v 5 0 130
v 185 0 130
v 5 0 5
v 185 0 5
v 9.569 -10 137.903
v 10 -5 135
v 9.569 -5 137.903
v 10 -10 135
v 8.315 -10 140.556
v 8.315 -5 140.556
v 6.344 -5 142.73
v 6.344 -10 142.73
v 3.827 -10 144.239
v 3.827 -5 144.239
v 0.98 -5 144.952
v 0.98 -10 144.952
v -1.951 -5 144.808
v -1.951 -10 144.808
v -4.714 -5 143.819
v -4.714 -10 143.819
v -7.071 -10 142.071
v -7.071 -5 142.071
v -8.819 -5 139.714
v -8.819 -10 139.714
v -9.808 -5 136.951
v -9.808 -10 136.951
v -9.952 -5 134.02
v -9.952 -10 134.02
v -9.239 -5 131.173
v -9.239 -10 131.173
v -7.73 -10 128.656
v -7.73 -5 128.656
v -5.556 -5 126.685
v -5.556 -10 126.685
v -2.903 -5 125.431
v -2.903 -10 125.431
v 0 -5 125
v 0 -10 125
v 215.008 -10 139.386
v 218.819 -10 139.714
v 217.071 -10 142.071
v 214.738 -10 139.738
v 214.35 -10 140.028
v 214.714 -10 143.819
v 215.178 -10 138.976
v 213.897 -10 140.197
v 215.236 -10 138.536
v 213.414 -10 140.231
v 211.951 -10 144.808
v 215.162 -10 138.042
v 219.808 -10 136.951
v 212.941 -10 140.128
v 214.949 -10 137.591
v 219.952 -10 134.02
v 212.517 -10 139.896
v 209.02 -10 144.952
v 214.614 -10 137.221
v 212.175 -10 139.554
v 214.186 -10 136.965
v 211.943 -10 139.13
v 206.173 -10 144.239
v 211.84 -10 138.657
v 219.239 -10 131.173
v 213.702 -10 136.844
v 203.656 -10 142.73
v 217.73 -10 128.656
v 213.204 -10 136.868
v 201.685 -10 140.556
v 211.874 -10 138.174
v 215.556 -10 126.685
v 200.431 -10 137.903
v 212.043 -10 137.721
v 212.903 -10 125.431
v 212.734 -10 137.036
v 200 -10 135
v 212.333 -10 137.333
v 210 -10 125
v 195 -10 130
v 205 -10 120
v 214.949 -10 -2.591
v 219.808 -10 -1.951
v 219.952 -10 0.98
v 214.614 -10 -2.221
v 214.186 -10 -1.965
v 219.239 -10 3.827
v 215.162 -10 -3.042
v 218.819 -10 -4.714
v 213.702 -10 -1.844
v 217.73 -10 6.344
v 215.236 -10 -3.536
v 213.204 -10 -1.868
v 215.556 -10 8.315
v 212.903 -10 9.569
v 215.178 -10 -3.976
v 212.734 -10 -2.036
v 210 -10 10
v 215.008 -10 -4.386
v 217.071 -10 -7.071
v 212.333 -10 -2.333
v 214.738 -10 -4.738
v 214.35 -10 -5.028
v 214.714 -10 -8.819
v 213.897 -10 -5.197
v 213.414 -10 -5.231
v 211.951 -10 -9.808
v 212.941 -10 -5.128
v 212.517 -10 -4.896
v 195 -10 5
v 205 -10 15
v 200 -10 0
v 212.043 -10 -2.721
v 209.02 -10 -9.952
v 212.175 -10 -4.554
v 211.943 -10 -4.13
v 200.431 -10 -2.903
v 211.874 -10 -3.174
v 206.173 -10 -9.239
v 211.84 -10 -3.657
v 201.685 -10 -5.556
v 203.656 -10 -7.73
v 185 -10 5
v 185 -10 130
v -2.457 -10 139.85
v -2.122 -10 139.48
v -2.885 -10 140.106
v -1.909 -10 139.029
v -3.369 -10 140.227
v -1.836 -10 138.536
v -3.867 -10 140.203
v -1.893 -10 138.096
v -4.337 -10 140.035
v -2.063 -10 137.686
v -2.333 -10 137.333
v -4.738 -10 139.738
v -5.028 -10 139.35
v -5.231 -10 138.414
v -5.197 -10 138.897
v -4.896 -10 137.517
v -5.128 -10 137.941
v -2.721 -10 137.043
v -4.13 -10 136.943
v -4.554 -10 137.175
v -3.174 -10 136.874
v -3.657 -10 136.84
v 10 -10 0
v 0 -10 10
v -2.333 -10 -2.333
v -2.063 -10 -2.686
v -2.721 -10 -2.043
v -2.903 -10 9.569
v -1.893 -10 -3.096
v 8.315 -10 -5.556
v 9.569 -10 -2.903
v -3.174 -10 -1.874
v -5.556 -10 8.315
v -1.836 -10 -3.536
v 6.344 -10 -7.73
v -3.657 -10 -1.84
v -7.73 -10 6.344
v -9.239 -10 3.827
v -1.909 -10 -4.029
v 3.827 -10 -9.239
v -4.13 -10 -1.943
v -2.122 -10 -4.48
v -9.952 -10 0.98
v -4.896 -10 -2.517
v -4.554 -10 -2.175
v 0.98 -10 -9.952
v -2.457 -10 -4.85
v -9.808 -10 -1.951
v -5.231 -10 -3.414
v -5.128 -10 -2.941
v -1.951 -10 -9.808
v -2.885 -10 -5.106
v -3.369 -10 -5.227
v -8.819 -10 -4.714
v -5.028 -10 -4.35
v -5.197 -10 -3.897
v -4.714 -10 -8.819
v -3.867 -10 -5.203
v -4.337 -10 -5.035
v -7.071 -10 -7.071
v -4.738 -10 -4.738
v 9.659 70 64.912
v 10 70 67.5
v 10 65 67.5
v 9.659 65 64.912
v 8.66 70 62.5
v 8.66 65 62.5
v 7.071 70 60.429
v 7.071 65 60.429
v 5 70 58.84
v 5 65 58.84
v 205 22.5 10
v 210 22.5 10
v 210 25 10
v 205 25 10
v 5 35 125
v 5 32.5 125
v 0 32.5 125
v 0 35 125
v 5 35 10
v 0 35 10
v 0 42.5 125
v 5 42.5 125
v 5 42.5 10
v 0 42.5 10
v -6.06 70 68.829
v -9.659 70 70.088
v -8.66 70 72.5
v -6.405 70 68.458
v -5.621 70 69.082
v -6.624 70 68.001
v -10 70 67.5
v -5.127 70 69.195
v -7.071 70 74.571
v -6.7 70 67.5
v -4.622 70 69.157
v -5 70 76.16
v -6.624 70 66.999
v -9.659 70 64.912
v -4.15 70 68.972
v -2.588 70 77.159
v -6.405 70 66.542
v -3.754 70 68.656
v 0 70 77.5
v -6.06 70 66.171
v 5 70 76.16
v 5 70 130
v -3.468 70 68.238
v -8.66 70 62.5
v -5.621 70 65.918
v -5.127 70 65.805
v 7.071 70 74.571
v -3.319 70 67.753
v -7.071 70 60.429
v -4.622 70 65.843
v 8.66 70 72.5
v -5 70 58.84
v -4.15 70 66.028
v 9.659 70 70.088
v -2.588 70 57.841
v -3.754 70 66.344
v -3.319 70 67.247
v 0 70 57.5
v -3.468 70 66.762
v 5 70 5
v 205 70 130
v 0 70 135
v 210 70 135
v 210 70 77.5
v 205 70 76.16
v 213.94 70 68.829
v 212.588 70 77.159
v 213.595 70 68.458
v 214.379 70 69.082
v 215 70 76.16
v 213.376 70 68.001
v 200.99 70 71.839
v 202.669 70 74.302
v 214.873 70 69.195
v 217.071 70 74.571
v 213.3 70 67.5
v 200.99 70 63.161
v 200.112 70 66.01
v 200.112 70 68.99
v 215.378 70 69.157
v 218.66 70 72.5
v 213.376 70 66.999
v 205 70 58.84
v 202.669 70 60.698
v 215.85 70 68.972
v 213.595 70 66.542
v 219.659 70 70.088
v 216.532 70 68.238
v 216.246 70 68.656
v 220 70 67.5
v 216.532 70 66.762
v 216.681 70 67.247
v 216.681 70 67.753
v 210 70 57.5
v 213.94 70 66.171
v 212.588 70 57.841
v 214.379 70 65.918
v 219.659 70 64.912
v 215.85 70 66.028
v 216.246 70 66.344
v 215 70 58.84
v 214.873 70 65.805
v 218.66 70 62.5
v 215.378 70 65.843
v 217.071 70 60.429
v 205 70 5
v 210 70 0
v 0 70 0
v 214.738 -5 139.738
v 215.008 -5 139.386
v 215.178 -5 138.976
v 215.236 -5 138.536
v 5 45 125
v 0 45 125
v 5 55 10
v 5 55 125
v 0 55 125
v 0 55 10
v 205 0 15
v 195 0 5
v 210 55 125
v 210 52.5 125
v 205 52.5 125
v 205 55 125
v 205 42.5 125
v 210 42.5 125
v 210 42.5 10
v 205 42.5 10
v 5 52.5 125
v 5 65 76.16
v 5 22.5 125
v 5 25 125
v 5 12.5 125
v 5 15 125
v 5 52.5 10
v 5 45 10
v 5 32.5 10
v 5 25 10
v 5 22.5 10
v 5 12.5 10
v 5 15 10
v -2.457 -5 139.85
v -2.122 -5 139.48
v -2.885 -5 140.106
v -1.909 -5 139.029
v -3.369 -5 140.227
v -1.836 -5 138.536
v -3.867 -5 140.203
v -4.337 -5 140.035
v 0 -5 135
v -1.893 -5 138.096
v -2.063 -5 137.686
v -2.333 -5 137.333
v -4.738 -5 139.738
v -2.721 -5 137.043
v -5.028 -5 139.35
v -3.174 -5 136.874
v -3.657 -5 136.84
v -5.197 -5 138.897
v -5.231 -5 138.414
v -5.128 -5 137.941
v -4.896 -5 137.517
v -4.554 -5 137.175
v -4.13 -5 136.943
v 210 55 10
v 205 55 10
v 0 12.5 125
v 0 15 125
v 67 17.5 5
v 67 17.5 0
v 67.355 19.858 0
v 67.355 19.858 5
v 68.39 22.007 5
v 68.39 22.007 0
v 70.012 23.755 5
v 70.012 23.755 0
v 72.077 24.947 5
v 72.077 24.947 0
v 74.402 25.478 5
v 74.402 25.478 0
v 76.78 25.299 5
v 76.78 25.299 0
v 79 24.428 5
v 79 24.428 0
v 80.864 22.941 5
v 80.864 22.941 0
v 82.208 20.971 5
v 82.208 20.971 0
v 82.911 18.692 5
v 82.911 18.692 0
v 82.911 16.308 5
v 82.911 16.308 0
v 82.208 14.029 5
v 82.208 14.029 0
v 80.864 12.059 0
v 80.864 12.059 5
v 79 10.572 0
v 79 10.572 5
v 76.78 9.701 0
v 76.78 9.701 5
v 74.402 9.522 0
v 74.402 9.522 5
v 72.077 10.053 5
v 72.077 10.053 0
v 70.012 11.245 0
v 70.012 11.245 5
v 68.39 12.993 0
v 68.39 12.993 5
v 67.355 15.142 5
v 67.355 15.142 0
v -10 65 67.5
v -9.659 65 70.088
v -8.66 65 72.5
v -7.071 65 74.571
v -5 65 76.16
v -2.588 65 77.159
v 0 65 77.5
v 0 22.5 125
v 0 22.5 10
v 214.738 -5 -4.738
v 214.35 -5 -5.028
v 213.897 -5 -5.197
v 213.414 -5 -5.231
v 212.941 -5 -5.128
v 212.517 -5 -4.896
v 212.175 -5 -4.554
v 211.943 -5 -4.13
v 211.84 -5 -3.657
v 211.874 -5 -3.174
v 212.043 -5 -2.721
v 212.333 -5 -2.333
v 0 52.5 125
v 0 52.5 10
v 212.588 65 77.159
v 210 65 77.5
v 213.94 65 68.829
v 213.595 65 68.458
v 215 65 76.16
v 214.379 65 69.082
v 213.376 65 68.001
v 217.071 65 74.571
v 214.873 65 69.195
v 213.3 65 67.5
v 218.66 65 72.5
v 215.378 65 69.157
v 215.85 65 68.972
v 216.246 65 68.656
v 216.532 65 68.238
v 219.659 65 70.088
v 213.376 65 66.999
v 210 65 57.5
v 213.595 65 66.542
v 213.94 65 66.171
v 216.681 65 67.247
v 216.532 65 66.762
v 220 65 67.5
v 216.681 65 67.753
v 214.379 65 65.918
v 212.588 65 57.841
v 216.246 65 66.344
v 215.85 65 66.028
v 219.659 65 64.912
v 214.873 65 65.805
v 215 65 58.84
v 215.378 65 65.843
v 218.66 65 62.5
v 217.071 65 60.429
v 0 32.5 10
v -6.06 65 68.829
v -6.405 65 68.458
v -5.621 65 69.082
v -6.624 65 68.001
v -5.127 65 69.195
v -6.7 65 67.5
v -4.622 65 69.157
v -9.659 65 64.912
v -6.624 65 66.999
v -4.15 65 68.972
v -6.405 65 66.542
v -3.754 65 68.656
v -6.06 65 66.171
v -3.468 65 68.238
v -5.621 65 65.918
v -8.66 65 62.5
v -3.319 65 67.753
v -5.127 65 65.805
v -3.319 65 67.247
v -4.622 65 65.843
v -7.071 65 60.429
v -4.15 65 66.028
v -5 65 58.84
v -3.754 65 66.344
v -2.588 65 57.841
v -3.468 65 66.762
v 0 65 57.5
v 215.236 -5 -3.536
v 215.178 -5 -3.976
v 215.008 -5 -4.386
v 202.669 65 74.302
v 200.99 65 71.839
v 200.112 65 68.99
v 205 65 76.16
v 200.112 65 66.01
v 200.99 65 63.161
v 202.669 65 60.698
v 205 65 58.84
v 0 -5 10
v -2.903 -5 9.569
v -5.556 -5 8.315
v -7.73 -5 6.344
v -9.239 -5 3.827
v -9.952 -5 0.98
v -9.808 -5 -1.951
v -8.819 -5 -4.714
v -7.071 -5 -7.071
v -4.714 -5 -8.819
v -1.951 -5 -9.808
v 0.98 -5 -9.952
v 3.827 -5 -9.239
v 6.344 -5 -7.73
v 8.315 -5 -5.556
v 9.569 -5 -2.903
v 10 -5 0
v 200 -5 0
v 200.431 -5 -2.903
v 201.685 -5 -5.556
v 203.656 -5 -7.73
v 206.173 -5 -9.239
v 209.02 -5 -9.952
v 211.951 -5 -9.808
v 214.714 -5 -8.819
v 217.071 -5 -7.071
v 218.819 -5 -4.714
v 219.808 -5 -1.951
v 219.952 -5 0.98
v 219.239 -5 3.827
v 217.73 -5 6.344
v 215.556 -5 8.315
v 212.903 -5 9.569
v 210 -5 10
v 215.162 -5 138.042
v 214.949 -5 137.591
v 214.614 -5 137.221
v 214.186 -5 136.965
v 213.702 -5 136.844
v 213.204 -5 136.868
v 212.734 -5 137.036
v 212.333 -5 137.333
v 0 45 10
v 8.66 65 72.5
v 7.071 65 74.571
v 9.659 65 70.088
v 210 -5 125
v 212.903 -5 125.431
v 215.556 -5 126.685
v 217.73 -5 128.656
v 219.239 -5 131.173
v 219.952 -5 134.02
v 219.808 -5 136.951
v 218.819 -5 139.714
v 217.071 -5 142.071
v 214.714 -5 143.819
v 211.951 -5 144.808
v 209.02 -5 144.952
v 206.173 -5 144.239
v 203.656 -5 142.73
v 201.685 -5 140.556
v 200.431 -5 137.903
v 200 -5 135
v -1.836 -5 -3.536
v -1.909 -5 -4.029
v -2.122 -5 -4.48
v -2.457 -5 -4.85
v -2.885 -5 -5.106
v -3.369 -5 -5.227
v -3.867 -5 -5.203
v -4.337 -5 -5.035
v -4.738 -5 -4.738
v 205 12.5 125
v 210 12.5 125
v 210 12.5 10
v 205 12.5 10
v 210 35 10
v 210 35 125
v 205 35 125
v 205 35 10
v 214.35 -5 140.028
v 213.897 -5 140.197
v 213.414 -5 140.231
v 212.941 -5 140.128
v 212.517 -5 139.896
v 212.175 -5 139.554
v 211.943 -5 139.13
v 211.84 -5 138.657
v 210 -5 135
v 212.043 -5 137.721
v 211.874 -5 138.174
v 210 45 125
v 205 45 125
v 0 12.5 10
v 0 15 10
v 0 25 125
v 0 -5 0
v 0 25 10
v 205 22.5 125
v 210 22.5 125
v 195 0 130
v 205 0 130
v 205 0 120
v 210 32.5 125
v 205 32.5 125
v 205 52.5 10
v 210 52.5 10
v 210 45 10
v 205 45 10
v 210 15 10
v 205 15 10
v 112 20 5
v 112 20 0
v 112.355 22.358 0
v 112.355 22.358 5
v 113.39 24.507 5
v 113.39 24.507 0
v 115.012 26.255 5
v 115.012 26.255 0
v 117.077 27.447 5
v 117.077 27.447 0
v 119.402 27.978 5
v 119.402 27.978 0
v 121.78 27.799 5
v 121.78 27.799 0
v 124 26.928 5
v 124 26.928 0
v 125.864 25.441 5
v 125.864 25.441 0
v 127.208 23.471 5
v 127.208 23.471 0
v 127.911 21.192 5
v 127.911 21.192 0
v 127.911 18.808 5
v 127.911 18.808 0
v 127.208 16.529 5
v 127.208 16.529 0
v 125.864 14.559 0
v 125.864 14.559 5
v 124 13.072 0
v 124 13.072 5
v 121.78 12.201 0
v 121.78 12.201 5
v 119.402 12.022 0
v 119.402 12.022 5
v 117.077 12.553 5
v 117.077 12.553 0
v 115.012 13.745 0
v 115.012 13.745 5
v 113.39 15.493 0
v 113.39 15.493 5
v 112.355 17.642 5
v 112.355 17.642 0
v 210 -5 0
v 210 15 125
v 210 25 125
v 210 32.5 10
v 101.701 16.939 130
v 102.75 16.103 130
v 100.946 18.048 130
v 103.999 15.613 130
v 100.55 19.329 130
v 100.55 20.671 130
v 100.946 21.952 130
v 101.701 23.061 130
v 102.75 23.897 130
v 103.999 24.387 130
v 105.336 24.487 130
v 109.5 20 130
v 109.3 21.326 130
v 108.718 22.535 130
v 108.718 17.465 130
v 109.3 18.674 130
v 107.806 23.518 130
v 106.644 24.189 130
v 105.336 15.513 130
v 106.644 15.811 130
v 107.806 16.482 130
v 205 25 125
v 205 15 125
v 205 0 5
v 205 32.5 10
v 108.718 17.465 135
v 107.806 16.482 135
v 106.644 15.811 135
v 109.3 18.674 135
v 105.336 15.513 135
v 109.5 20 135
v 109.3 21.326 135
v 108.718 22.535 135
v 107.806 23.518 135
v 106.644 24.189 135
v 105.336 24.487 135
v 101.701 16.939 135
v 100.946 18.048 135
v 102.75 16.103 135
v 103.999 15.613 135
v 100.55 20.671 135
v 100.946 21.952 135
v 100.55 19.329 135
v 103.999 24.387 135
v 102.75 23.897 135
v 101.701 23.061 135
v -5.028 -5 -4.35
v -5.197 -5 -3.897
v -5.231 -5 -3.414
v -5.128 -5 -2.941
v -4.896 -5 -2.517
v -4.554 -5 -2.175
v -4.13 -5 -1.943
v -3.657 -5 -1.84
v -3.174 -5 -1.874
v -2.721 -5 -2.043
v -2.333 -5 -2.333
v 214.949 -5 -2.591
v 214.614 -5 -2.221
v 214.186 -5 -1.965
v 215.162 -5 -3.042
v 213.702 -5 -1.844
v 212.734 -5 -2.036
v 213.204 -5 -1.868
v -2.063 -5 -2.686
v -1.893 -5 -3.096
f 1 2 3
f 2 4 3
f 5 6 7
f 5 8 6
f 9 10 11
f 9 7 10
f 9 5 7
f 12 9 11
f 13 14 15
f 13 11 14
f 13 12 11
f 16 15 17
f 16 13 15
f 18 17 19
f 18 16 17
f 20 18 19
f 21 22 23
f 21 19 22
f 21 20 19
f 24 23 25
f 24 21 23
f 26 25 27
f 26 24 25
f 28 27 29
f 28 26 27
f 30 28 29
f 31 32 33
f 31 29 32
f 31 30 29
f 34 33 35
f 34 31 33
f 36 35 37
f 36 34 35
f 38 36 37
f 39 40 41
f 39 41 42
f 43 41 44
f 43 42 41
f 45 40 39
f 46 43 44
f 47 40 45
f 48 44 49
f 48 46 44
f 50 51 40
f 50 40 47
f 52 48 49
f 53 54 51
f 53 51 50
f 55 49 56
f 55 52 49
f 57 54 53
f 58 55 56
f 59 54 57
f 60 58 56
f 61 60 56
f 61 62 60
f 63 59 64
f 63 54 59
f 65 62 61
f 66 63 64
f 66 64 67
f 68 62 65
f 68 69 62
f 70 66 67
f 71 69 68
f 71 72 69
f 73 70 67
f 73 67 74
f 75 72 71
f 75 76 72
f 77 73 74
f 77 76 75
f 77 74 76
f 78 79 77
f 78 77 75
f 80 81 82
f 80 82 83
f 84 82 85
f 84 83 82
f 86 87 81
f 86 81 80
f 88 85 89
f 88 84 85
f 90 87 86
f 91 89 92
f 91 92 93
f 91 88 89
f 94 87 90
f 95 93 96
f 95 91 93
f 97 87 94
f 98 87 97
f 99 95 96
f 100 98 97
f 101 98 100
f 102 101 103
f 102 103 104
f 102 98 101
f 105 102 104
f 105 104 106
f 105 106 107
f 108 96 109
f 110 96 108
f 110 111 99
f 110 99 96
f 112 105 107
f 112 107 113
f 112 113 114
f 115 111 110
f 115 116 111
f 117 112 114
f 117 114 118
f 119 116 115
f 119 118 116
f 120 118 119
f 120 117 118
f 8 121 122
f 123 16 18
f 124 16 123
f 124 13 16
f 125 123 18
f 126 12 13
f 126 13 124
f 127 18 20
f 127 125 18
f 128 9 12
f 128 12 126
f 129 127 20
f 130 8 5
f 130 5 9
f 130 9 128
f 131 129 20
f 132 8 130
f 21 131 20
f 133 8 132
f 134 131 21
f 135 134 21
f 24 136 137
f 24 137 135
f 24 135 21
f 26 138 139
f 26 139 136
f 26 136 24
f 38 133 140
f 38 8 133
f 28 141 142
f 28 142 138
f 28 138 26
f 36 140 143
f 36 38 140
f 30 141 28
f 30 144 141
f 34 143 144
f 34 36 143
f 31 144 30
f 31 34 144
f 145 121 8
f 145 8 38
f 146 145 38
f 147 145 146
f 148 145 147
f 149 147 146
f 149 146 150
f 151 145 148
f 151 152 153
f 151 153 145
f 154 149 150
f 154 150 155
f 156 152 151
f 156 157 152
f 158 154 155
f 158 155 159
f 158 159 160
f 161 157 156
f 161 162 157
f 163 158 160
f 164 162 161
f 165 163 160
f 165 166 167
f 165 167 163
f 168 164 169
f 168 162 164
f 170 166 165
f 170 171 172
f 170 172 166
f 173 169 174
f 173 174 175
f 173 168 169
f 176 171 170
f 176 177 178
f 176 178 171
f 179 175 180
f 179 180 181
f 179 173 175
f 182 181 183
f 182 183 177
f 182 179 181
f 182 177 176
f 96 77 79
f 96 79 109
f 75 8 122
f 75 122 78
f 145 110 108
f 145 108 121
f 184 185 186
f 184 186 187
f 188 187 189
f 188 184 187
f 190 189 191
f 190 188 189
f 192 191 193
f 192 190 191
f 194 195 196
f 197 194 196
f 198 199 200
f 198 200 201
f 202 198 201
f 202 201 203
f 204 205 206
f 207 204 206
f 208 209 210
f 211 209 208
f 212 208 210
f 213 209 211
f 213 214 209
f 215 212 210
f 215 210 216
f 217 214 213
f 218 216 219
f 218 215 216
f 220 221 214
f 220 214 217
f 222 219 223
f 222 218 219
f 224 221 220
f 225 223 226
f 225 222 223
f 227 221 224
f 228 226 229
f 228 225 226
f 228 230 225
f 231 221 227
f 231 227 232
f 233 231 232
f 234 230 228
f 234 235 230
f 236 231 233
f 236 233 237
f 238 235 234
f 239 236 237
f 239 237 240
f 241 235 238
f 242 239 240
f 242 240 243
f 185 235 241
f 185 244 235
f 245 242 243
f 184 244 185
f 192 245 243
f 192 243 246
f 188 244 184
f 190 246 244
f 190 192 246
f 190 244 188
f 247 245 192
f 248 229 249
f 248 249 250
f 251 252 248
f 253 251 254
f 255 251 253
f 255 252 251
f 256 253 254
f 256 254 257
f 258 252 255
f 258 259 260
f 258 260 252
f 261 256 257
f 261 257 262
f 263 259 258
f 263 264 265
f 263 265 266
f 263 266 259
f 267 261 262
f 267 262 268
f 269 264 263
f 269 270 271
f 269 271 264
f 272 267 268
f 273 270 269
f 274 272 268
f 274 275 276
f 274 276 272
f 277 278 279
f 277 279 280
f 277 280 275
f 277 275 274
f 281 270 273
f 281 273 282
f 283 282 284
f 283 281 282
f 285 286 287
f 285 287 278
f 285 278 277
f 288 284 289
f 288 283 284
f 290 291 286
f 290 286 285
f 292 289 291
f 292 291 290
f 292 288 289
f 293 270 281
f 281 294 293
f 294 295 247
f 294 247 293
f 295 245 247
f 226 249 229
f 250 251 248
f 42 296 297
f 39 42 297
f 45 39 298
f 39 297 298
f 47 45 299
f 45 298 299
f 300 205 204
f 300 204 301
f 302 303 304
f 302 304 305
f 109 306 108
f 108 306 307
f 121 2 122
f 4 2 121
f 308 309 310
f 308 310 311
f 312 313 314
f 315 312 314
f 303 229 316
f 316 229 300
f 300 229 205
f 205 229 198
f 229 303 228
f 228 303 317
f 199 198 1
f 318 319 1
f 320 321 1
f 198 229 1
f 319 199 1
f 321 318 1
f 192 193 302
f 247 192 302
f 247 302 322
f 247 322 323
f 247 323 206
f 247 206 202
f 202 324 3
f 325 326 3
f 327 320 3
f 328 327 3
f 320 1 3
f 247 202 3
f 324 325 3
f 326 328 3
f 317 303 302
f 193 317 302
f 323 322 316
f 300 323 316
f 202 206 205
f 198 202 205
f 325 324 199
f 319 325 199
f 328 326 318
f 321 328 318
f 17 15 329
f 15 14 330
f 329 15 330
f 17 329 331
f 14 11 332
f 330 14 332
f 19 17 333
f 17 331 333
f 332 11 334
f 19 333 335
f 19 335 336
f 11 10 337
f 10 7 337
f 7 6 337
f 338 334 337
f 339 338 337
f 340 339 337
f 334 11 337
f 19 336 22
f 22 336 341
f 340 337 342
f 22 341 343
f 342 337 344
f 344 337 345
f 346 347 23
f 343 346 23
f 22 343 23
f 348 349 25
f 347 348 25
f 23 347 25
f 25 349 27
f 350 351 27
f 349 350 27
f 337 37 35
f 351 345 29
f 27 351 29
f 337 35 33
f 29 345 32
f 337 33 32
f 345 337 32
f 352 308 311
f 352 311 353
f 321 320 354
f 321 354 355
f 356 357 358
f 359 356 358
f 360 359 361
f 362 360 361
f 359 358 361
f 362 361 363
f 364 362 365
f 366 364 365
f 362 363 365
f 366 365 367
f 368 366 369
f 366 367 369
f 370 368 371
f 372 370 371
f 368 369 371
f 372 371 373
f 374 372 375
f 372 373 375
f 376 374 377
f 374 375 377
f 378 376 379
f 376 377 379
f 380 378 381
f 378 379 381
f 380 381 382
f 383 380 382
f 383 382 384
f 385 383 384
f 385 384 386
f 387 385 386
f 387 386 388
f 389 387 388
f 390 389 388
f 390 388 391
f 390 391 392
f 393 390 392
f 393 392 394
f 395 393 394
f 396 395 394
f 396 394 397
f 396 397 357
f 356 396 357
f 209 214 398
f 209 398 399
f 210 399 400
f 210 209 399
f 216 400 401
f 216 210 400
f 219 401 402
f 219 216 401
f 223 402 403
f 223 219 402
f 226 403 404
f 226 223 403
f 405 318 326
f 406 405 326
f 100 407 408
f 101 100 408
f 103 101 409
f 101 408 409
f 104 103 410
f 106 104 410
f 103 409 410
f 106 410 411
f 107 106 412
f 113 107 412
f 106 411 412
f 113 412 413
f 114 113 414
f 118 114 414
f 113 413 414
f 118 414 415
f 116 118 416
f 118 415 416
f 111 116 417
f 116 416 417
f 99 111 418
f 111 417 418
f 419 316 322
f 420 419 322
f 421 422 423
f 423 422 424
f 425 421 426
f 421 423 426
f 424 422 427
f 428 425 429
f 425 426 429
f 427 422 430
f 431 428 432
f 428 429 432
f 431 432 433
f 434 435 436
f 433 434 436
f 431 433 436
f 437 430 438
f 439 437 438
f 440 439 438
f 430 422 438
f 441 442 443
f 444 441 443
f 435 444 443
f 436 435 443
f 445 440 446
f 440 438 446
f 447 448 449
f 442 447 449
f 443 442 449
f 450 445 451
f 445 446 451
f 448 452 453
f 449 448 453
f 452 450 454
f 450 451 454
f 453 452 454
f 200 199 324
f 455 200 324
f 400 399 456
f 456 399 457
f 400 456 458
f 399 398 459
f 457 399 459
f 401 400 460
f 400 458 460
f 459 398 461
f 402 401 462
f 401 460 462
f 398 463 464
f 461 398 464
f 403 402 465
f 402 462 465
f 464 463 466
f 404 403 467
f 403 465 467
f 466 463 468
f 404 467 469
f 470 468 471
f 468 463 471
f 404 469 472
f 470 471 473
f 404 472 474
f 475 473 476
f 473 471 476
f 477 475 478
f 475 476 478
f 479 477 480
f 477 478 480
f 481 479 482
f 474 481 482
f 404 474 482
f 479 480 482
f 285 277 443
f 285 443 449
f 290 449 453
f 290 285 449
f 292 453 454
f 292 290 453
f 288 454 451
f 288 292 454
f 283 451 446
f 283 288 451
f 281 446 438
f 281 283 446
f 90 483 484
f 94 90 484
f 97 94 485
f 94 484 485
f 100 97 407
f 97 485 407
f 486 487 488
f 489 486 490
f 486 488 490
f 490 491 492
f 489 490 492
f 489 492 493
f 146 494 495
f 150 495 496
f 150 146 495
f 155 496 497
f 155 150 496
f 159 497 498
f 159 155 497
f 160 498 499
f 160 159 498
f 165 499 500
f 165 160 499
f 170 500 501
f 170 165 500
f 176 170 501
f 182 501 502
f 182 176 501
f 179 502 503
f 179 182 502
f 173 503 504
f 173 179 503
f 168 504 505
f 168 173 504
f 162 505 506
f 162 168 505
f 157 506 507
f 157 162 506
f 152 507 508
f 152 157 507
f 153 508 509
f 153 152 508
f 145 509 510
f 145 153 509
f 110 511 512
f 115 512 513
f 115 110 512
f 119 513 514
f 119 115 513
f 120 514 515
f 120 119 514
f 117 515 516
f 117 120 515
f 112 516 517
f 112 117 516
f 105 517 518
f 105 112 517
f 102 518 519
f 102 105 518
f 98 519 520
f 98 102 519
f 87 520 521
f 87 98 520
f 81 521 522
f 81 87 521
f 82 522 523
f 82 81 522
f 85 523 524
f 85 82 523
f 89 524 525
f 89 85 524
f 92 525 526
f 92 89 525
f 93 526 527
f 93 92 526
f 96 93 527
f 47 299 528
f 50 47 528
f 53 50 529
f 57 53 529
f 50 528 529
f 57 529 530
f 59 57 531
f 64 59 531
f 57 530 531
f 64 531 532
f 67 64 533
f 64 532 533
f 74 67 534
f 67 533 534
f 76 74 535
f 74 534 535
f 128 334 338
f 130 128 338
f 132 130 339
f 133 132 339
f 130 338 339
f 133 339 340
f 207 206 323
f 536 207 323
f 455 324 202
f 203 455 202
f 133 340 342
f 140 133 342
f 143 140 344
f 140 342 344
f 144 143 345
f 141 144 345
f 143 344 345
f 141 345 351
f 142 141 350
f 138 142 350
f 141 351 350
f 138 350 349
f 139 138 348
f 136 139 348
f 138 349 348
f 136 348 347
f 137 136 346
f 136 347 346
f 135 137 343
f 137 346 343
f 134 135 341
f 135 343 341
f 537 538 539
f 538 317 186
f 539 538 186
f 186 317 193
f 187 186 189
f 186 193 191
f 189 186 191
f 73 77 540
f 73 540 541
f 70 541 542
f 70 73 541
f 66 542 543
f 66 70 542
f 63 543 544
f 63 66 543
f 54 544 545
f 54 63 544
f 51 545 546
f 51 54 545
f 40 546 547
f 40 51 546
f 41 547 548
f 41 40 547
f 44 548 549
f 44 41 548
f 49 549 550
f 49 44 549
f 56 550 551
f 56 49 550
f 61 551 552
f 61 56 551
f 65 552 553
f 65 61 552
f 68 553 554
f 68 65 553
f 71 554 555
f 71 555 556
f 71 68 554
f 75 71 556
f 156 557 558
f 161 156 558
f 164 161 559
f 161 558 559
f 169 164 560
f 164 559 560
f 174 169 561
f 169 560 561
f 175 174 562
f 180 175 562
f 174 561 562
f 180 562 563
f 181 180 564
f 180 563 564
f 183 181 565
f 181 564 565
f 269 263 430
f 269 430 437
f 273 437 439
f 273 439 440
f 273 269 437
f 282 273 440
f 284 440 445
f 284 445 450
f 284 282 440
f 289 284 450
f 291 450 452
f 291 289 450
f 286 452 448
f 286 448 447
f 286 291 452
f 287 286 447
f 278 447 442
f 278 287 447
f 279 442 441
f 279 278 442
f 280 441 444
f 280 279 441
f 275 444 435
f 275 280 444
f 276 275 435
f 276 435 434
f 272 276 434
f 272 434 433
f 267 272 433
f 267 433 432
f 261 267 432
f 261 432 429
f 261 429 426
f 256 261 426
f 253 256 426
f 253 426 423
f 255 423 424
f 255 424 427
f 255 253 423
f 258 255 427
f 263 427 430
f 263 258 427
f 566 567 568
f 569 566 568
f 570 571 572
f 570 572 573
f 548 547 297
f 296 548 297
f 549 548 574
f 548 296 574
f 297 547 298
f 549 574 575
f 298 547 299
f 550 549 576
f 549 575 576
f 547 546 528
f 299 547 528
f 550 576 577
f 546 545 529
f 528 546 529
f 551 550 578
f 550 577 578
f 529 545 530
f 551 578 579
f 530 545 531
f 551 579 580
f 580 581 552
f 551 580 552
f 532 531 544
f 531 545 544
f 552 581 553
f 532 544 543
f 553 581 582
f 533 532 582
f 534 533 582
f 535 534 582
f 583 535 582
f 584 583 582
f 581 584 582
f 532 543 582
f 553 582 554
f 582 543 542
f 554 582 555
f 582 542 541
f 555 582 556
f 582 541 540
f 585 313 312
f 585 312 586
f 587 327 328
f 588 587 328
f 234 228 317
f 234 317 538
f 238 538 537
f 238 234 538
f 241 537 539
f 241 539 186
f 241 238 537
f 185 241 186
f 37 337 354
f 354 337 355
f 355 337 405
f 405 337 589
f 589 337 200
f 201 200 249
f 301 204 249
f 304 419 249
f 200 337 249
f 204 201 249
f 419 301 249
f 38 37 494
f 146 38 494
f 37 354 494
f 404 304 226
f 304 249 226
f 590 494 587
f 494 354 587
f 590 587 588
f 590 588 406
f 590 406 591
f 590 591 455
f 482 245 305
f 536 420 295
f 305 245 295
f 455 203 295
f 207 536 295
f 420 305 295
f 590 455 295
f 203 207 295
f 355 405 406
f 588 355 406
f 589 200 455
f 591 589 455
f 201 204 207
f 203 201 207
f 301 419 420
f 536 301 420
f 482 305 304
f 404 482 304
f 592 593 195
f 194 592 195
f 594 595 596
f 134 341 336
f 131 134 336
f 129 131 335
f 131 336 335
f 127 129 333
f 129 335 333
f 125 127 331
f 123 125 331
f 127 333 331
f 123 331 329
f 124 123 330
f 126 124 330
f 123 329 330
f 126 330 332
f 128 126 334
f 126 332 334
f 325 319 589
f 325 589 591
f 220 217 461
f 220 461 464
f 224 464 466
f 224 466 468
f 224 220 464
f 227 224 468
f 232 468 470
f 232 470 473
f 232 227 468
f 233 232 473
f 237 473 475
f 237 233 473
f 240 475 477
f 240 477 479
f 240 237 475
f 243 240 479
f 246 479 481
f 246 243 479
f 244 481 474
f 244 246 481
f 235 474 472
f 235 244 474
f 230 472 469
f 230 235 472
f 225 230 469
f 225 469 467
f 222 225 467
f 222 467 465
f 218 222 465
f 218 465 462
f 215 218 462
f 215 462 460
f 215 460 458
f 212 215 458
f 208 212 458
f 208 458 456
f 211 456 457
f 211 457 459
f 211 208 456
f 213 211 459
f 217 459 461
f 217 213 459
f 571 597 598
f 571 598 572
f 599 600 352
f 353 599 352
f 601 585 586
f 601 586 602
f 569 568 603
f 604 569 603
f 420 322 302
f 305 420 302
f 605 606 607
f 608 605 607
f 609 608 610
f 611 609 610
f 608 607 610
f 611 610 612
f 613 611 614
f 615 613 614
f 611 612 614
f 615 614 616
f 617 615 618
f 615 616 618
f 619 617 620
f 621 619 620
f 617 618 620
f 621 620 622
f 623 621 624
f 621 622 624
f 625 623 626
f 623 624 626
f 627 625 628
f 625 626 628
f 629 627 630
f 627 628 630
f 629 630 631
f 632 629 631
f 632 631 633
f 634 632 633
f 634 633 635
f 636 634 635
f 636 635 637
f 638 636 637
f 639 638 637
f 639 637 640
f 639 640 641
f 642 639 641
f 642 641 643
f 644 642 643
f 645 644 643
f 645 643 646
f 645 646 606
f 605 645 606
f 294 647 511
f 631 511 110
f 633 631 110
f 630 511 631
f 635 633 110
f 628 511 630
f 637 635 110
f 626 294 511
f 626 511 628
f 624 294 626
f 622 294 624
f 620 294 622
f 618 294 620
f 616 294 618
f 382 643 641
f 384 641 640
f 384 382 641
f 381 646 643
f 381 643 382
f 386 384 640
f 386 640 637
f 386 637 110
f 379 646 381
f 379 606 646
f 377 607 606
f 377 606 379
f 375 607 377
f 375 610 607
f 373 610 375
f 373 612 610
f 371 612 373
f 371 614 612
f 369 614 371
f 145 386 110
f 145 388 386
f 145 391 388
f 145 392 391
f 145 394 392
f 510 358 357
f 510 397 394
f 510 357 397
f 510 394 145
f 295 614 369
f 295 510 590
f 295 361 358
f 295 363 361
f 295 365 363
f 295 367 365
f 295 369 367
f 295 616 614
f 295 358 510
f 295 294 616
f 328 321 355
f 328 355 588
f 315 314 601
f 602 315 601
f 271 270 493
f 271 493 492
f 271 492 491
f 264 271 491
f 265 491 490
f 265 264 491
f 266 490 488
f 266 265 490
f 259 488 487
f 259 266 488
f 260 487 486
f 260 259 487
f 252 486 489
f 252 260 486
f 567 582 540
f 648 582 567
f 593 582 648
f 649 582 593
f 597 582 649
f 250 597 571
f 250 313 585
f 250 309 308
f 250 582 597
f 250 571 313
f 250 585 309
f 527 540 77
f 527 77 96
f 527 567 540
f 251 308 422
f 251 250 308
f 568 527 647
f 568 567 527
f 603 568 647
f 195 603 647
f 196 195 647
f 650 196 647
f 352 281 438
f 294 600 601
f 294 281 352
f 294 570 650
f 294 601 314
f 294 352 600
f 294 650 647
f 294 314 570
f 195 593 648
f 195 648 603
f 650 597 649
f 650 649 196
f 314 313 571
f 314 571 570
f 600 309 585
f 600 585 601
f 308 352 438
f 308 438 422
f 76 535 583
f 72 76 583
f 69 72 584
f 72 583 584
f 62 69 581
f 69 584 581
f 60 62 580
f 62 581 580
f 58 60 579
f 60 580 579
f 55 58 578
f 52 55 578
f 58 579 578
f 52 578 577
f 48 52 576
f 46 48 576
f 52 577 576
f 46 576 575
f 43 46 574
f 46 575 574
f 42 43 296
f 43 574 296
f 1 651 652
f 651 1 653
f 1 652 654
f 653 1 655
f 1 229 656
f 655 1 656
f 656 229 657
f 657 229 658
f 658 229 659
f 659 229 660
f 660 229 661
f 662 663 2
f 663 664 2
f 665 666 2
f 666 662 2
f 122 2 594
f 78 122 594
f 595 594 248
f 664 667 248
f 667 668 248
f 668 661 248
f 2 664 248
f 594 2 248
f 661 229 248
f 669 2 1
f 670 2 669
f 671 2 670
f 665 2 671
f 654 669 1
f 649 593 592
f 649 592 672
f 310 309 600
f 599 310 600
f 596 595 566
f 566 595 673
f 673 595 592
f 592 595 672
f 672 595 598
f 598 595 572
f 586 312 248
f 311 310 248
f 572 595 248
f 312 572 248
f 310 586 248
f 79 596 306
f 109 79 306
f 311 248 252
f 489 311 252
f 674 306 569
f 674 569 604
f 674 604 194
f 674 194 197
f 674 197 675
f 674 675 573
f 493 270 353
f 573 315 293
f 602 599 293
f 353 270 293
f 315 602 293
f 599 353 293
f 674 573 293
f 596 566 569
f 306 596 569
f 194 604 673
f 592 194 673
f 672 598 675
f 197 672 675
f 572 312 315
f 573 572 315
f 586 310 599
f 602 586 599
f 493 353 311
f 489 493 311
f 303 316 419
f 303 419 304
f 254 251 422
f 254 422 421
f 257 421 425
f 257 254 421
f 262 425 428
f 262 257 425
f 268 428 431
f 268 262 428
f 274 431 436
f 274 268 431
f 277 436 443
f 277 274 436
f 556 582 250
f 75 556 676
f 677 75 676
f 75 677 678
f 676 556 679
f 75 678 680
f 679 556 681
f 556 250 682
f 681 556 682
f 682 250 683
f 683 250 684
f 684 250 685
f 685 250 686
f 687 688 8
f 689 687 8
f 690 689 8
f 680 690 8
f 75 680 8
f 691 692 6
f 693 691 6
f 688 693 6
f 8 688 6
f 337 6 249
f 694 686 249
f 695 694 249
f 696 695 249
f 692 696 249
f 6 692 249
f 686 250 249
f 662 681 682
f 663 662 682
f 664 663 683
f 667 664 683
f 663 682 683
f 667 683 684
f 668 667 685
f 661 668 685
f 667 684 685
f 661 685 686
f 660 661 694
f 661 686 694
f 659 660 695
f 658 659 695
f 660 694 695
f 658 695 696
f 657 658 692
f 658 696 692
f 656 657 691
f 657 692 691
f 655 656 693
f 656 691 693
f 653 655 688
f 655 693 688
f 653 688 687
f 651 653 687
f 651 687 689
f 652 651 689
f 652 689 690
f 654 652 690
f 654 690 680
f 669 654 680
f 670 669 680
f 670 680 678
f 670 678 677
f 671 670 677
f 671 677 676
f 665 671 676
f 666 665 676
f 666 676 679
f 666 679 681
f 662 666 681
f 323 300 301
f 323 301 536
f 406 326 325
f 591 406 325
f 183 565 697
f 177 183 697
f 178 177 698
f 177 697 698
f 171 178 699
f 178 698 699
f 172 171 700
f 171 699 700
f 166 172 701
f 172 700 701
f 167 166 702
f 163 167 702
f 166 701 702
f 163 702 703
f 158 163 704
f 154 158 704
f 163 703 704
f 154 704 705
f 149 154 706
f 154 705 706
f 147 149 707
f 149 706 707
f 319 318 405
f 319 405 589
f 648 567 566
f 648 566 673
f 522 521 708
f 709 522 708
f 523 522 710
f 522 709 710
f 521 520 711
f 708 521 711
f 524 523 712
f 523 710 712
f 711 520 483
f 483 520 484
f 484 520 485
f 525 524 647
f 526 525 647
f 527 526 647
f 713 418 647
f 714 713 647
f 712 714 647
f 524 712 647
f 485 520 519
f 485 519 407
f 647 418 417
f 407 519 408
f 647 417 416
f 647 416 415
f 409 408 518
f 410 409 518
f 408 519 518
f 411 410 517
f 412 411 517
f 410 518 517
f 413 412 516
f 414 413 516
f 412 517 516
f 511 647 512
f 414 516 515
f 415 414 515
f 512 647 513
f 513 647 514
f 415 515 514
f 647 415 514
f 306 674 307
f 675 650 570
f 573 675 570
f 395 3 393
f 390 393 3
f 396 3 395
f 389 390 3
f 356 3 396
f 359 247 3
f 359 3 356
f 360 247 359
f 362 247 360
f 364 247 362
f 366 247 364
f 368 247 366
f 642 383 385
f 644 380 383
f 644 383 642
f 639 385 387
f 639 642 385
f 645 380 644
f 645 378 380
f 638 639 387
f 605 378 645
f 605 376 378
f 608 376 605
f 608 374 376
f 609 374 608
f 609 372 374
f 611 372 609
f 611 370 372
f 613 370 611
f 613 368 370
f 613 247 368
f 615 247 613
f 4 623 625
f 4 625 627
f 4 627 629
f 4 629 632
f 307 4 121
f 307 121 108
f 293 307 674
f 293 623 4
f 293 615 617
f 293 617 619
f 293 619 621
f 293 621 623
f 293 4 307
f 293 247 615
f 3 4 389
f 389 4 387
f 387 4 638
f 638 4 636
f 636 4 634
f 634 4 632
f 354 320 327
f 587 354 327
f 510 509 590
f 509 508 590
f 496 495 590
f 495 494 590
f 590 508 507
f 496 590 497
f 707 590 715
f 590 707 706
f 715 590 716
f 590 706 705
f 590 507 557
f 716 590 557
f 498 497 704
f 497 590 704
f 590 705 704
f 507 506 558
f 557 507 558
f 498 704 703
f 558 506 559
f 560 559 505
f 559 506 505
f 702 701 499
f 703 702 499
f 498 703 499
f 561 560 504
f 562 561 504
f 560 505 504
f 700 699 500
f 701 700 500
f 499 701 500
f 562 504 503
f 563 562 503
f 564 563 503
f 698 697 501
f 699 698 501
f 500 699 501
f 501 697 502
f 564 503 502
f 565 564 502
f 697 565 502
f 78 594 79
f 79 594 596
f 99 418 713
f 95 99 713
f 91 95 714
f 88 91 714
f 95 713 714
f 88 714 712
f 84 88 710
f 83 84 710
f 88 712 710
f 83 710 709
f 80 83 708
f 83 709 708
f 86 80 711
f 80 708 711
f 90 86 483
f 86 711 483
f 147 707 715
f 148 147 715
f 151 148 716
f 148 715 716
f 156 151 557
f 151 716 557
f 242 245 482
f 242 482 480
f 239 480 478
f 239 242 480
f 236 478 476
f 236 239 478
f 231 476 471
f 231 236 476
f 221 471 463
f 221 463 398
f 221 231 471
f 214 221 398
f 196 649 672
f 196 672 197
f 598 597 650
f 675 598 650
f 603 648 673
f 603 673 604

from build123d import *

# Parameters (mm, degrees)
SKETCH1_W           = 200
SKETCH1_H           = 125
BOSS_EXTRUDE1_DEPTH = 70
SKETCH2_W           = 210
SKETCH2_H           = 135
BOSS_EXTRUDE2_DEPTH = 10
SKETCH3_R           = 10
BOSS_EXTRUDE5_DEPTH = 5
CUT_EXTRUDE2_DEPTH  = 5
CUT_EXTRUDE3_DEPTH  = 10
SKETCH10_W          = 10
SKETCH10_H          = 125
CUT_EXTRUDE4_DEPTH  = 10
BOSS_EXTRUDE6_DEPTH = 5
SKETCH12_R          = 8
CUT_EXTRUDE5_DEPTH  = 10
SKETCH15_R          = 4.5
CUT_EXTRUDE6_DEPTH  = 10
SKETCH18_W          = 115
SKETCH18_H          = 2.5
CUT_EXTRUDE7_DEPTH  = 220


with BuildPart() as part:
    # Sketch1 → Boss-Extrude1 (new body)
    with BuildSketch(Plane(origin=(0, 0, 0), x_dir=(1, 0, 0), z_dir=(0, 1, 0))):
        Polygon((210, 0), (0, 0), (0, -135), (5, -135), (210, -135), align=None)
        with Locations((105, -67.5)):
            Rectangle(SKETCH1_W, SKETCH1_H, mode=Mode.SUBTRACT)
    extrude(amount=BOSS_EXTRUDE1_DEPTH)

    # Sketch2 → Boss-Extrude2 (add)
    with BuildSketch(Plane(origin=(0, 0, 0), x_dir=(-1, 0, 0), z_dir=(0, -1, 0))):
        with Locations((-105, -67.5)):
            Rectangle(SKETCH2_W, SKETCH2_H)
    extrude(amount=BOSS_EXTRUDE2_DEPTH)

    # Sketch3 → Boss-Extrude5 (add)
    with BuildSketch(Plane(origin=(0, -10, 0), x_dir=(-1, 0, 0), z_dir=(0, -1, 0))):
        with Locations((-210, 0)):
            Circle(SKETCH3_R)
        Circle(SKETCH3_R)
        with Locations((0, -135)):
            Circle(SKETCH3_R)
        with Locations((-210, -135)):
            Circle(SKETCH3_R)
    extrude(amount=-BOSS_EXTRUDE5_DEPTH)

    # Sketch7 → Cut-Extrude2 (cut)
    with BuildSketch(Plane(origin=(0, -5, 0), x_dir=(1, 0, 0), z_dir=(0, 1, 0))):
        with BuildLine():
            ThreePointArc((215.235533906, -138.535533906), (214.186095741, -136.964938701), (212.333452378, -137.333452378))
            Line((212.333452378, -137.333452378), (214.737615434, -139.737615434))
            ThreePointArc((214.737615434, -139.737615434), (215.106129111, -139.186095741), (215.235533906, -138.535533906))
        make_face()
        with BuildLine():
            Line((214.737615434, -139.737615434), (212.333452378, -137.333452378))
            ThreePointArc((212.333452378, -137.333452378), (212.333452378, -139.737615434), (214.737615434, -139.737615434))
        make_face()
        with BuildLine():
            ThreePointArc((214.737615434, 4.737615434), (212.333452378, 4.737615434), (212.333452378, 2.333452378))
            Line((212.333452378, 2.333452378), (214.737615434, 4.737615434))
        make_face()
        with BuildLine():
            Line((214.737615434, 4.737615434), (212.333452378, 2.333452378))
            ThreePointArc((212.333452378, 2.333452378), (214.186095741, 1.964938701), (215.235533906, 3.535533906))
            ThreePointArc((215.235533906, 3.535533906), (215.106129111, 4.186095741), (214.737615434, 4.737615434))
        make_face()
        with BuildLine():
            ThreePointArc((-4.737615434, 4.737615434), (-4.737615434, 2.333452378), (-2.333452378, 2.333452378))
            Line((-2.333452378, 2.333452378), (-4.737615434, 4.737615434))
        make_face()
        with BuildLine():
            Line((-4.737615434, 4.737615434), (-2.333452378, 2.333452378))
            ThreePointArc((-2.333452378, 2.333452378), (-1.964938701, 2.884972071), (-1.835533906, 3.535533906))
            ThreePointArc((-1.835533906, 3.535533906), (-2.884972071, 5.106129111), (-4.737615434, 4.737615434))
        make_face()
        with BuildLine():
            ThreePointArc((-1.835533906, -138.535533906), (-1.964938701, -137.884972071), (-2.333452378, -137.333452378))
            Line((-2.333452378, -137.333452378), (-4.737615434, -139.737615434))
            ThreePointArc((-4.737615434, -139.737615434), (-2.884972071, -140.106129111), (-1.835533906, -138.535533906))
        make_face()
        with BuildLine():
            Line((-4.737615434, -139.737615434), (-2.333452378, -137.333452378))
            ThreePointArc((-2.333452378, -137.333452378), (-4.737615434, -137.333452378), (-4.737615434, -139.737615434))
        make_face()
    extrude(amount=-CUT_EXTRUDE2_DEPTH, mode=Mode.SUBTRACT)

    # Sketch9 → Cut-Extrude3 (cut)
    with BuildSketch(Plane(origin=(0, 0, 0), x_dir=(1, 0, 0), z_dir=(0, 1, 0))):
        Polygon((195, -130), (200, -125), (205, -120), (205, -15), (200, -10), (195, -5), align=None)
    extrude(amount=-CUT_EXTRUDE3_DEPTH, mode=Mode.SUBTRACT)

    # Sketch10 → Cut-Extrude4 (cut)
    with BuildSketch(Plane(origin=(0, 0, 0), x_dir=(1, 0, 0), z_dir=(0, 1, 0))):
        with Locations((190, -67.5)):
            Rectangle(SKETCH10_W, SKETCH10_H)
    extrude(amount=-CUT_EXTRUDE4_DEPTH, mode=Mode.SUBTRACT)

    # Sketch11 → Boss-Extrude6 (add)
    with BuildSketch(Plane(origin=(0, 70, 0), x_dir=(1, 0, 0), z_dir=(0, 1, 0))):
        with BuildLine():
            ThreePointArc((213.3, -67.5), (215, -65.8), (216.7, -67.5))
            Line((216.7, -67.5), (220, -67.5))
            ThreePointArc((220, -67.5), (217.071067812, -60.428932188), (210, -57.5))
            Line((210, -57.5), (210, -67.5))
            Line((210, -67.5), (213.3, -67.5))
        make_face()
        with BuildLine():
            Line((220, -67.5), (216.7, -67.5))
            ThreePointArc((216.7, -67.5), (215, -69.2), (213.3, -67.5))
            Line((213.3, -67.5), (210, -67.5))
            Line((210, -67.5), (210, -77.5))
            ThreePointArc((210, -77.5), (217.071067812, -74.571067812), (220, -67.5))
        make_face()
        with BuildLine():
            Line((205, -76.160254038), (205, -58.839745962))
            ThreePointArc((205, -58.839745962), (200, -67.5), (205, -76.160254038))
        make_face()
        with BuildLine():
            Line((210, -67.5), (210, -57.5))
            ThreePointArc((210, -57.5), (207.411809549, -57.840741737), (205, -58.839745962))
            Line((205, -58.839745962), (205, -76.160254038))
            ThreePointArc((205, -76.160254038), (207.411809549, -77.159258263), (210, -77.5))
            Line((210, -77.5), (210, -67.5))
        make_face()
        with BuildLine():
            ThreePointArc((10, -67.5), (8.660254038, -62.5), (5, -58.839745962))
            Line((5, -58.839745962), (5, -76.160254038))
            ThreePointArc((5, -76.160254038), (8.660254038, -72.5), (10, -67.5))
        make_face()
        with BuildLine():
            Line((0, -57.5), (0, -67.5))
            Line((0, -67.5), (0, -77.5))
            ThreePointArc((0, -77.5), (2.588190451, -77.159258263), (5, -76.160254038))
            Line((5, -76.160254038), (5, -58.839745962))
            ThreePointArc((5, -58.839745962), (2.588190451, -57.840741737), (0, -57.5))
        make_face()
        with BuildLine():
            Line((0, -77.5), (0, -67.5))
            Line((0, -67.5), (-3.3, -67.5))
            ThreePointArc((-3.3, -67.5), (-5, -69.2), (-6.7, -67.5))
            Line((-6.7, -67.5), (-10, -67.5))
            ThreePointArc((-10, -67.5), (-7.071067812, -74.571067812), (0, -77.5))
        make_face()
        with BuildLine():
            Line((-3.3, -67.5), (0, -67.5))
            Line((0, -67.5), (0, -57.5))
            ThreePointArc((0, -57.5), (-7.071067812, -60.428932188), (-10, -67.5))
            Line((-10, -67.5), (-6.7, -67.5))
            ThreePointArc((-6.7, -67.5), (-5, -65.8), (-3.3, -67.5))
        make_face()
    extrude(amount=-BOSS_EXTRUDE6_DEPTH)

    # Sketch12 → Cut-Extrude5 (cut)
    with BuildSketch(Plane(origin=(0, 0, 0), x_dir=(-1, 0, 0), z_dir=(0, 0, -1))):
        with Locations((-75, 17.5)):
            Circle(SKETCH12_R)
        with Locations((-120, 20)):
            Circle(SKETCH12_R)
    extrude(amount=-CUT_EXTRUDE5_DEPTH, mode=Mode.SUBTRACT)

    # Sketch15 → Cut-Extrude6 (cut)
    with BuildSketch(Plane.XY.offset(135)):
        with Locations((105, 20)):
            Circle(SKETCH15_R)
    extrude(amount=-CUT_EXTRUDE6_DEPTH, mode=Mode.SUBTRACT)

    # Sketch18 → Cut-Extrude7 (cut)
    with BuildSketch(Plane(origin=(210, 0, 0), x_dir=(0, 0, -1), z_dir=(1, 0, 0))):
        with Locations((-67.5, 43.75)):
            Rectangle(SKETCH18_W, SKETCH18_H)
        with Locations((-67.5, 53.75)):
            Rectangle(SKETCH18_W, SKETCH18_H)
        with Locations((-67.5, 33.75)):
            Rectangle(SKETCH18_W, SKETCH18_H)
        with Locations((-67.5, 23.75)):
            Rectangle(SKETCH18_W, SKETCH18_H)
        with Locations((-67.5, 13.75)):
            Rectangle(SKETCH18_W, SKETCH18_H)
    extrude(amount=-CUT_EXTRUDE7_DEPTH, mode=Mode.SUBTRACT)


solid = part.part
